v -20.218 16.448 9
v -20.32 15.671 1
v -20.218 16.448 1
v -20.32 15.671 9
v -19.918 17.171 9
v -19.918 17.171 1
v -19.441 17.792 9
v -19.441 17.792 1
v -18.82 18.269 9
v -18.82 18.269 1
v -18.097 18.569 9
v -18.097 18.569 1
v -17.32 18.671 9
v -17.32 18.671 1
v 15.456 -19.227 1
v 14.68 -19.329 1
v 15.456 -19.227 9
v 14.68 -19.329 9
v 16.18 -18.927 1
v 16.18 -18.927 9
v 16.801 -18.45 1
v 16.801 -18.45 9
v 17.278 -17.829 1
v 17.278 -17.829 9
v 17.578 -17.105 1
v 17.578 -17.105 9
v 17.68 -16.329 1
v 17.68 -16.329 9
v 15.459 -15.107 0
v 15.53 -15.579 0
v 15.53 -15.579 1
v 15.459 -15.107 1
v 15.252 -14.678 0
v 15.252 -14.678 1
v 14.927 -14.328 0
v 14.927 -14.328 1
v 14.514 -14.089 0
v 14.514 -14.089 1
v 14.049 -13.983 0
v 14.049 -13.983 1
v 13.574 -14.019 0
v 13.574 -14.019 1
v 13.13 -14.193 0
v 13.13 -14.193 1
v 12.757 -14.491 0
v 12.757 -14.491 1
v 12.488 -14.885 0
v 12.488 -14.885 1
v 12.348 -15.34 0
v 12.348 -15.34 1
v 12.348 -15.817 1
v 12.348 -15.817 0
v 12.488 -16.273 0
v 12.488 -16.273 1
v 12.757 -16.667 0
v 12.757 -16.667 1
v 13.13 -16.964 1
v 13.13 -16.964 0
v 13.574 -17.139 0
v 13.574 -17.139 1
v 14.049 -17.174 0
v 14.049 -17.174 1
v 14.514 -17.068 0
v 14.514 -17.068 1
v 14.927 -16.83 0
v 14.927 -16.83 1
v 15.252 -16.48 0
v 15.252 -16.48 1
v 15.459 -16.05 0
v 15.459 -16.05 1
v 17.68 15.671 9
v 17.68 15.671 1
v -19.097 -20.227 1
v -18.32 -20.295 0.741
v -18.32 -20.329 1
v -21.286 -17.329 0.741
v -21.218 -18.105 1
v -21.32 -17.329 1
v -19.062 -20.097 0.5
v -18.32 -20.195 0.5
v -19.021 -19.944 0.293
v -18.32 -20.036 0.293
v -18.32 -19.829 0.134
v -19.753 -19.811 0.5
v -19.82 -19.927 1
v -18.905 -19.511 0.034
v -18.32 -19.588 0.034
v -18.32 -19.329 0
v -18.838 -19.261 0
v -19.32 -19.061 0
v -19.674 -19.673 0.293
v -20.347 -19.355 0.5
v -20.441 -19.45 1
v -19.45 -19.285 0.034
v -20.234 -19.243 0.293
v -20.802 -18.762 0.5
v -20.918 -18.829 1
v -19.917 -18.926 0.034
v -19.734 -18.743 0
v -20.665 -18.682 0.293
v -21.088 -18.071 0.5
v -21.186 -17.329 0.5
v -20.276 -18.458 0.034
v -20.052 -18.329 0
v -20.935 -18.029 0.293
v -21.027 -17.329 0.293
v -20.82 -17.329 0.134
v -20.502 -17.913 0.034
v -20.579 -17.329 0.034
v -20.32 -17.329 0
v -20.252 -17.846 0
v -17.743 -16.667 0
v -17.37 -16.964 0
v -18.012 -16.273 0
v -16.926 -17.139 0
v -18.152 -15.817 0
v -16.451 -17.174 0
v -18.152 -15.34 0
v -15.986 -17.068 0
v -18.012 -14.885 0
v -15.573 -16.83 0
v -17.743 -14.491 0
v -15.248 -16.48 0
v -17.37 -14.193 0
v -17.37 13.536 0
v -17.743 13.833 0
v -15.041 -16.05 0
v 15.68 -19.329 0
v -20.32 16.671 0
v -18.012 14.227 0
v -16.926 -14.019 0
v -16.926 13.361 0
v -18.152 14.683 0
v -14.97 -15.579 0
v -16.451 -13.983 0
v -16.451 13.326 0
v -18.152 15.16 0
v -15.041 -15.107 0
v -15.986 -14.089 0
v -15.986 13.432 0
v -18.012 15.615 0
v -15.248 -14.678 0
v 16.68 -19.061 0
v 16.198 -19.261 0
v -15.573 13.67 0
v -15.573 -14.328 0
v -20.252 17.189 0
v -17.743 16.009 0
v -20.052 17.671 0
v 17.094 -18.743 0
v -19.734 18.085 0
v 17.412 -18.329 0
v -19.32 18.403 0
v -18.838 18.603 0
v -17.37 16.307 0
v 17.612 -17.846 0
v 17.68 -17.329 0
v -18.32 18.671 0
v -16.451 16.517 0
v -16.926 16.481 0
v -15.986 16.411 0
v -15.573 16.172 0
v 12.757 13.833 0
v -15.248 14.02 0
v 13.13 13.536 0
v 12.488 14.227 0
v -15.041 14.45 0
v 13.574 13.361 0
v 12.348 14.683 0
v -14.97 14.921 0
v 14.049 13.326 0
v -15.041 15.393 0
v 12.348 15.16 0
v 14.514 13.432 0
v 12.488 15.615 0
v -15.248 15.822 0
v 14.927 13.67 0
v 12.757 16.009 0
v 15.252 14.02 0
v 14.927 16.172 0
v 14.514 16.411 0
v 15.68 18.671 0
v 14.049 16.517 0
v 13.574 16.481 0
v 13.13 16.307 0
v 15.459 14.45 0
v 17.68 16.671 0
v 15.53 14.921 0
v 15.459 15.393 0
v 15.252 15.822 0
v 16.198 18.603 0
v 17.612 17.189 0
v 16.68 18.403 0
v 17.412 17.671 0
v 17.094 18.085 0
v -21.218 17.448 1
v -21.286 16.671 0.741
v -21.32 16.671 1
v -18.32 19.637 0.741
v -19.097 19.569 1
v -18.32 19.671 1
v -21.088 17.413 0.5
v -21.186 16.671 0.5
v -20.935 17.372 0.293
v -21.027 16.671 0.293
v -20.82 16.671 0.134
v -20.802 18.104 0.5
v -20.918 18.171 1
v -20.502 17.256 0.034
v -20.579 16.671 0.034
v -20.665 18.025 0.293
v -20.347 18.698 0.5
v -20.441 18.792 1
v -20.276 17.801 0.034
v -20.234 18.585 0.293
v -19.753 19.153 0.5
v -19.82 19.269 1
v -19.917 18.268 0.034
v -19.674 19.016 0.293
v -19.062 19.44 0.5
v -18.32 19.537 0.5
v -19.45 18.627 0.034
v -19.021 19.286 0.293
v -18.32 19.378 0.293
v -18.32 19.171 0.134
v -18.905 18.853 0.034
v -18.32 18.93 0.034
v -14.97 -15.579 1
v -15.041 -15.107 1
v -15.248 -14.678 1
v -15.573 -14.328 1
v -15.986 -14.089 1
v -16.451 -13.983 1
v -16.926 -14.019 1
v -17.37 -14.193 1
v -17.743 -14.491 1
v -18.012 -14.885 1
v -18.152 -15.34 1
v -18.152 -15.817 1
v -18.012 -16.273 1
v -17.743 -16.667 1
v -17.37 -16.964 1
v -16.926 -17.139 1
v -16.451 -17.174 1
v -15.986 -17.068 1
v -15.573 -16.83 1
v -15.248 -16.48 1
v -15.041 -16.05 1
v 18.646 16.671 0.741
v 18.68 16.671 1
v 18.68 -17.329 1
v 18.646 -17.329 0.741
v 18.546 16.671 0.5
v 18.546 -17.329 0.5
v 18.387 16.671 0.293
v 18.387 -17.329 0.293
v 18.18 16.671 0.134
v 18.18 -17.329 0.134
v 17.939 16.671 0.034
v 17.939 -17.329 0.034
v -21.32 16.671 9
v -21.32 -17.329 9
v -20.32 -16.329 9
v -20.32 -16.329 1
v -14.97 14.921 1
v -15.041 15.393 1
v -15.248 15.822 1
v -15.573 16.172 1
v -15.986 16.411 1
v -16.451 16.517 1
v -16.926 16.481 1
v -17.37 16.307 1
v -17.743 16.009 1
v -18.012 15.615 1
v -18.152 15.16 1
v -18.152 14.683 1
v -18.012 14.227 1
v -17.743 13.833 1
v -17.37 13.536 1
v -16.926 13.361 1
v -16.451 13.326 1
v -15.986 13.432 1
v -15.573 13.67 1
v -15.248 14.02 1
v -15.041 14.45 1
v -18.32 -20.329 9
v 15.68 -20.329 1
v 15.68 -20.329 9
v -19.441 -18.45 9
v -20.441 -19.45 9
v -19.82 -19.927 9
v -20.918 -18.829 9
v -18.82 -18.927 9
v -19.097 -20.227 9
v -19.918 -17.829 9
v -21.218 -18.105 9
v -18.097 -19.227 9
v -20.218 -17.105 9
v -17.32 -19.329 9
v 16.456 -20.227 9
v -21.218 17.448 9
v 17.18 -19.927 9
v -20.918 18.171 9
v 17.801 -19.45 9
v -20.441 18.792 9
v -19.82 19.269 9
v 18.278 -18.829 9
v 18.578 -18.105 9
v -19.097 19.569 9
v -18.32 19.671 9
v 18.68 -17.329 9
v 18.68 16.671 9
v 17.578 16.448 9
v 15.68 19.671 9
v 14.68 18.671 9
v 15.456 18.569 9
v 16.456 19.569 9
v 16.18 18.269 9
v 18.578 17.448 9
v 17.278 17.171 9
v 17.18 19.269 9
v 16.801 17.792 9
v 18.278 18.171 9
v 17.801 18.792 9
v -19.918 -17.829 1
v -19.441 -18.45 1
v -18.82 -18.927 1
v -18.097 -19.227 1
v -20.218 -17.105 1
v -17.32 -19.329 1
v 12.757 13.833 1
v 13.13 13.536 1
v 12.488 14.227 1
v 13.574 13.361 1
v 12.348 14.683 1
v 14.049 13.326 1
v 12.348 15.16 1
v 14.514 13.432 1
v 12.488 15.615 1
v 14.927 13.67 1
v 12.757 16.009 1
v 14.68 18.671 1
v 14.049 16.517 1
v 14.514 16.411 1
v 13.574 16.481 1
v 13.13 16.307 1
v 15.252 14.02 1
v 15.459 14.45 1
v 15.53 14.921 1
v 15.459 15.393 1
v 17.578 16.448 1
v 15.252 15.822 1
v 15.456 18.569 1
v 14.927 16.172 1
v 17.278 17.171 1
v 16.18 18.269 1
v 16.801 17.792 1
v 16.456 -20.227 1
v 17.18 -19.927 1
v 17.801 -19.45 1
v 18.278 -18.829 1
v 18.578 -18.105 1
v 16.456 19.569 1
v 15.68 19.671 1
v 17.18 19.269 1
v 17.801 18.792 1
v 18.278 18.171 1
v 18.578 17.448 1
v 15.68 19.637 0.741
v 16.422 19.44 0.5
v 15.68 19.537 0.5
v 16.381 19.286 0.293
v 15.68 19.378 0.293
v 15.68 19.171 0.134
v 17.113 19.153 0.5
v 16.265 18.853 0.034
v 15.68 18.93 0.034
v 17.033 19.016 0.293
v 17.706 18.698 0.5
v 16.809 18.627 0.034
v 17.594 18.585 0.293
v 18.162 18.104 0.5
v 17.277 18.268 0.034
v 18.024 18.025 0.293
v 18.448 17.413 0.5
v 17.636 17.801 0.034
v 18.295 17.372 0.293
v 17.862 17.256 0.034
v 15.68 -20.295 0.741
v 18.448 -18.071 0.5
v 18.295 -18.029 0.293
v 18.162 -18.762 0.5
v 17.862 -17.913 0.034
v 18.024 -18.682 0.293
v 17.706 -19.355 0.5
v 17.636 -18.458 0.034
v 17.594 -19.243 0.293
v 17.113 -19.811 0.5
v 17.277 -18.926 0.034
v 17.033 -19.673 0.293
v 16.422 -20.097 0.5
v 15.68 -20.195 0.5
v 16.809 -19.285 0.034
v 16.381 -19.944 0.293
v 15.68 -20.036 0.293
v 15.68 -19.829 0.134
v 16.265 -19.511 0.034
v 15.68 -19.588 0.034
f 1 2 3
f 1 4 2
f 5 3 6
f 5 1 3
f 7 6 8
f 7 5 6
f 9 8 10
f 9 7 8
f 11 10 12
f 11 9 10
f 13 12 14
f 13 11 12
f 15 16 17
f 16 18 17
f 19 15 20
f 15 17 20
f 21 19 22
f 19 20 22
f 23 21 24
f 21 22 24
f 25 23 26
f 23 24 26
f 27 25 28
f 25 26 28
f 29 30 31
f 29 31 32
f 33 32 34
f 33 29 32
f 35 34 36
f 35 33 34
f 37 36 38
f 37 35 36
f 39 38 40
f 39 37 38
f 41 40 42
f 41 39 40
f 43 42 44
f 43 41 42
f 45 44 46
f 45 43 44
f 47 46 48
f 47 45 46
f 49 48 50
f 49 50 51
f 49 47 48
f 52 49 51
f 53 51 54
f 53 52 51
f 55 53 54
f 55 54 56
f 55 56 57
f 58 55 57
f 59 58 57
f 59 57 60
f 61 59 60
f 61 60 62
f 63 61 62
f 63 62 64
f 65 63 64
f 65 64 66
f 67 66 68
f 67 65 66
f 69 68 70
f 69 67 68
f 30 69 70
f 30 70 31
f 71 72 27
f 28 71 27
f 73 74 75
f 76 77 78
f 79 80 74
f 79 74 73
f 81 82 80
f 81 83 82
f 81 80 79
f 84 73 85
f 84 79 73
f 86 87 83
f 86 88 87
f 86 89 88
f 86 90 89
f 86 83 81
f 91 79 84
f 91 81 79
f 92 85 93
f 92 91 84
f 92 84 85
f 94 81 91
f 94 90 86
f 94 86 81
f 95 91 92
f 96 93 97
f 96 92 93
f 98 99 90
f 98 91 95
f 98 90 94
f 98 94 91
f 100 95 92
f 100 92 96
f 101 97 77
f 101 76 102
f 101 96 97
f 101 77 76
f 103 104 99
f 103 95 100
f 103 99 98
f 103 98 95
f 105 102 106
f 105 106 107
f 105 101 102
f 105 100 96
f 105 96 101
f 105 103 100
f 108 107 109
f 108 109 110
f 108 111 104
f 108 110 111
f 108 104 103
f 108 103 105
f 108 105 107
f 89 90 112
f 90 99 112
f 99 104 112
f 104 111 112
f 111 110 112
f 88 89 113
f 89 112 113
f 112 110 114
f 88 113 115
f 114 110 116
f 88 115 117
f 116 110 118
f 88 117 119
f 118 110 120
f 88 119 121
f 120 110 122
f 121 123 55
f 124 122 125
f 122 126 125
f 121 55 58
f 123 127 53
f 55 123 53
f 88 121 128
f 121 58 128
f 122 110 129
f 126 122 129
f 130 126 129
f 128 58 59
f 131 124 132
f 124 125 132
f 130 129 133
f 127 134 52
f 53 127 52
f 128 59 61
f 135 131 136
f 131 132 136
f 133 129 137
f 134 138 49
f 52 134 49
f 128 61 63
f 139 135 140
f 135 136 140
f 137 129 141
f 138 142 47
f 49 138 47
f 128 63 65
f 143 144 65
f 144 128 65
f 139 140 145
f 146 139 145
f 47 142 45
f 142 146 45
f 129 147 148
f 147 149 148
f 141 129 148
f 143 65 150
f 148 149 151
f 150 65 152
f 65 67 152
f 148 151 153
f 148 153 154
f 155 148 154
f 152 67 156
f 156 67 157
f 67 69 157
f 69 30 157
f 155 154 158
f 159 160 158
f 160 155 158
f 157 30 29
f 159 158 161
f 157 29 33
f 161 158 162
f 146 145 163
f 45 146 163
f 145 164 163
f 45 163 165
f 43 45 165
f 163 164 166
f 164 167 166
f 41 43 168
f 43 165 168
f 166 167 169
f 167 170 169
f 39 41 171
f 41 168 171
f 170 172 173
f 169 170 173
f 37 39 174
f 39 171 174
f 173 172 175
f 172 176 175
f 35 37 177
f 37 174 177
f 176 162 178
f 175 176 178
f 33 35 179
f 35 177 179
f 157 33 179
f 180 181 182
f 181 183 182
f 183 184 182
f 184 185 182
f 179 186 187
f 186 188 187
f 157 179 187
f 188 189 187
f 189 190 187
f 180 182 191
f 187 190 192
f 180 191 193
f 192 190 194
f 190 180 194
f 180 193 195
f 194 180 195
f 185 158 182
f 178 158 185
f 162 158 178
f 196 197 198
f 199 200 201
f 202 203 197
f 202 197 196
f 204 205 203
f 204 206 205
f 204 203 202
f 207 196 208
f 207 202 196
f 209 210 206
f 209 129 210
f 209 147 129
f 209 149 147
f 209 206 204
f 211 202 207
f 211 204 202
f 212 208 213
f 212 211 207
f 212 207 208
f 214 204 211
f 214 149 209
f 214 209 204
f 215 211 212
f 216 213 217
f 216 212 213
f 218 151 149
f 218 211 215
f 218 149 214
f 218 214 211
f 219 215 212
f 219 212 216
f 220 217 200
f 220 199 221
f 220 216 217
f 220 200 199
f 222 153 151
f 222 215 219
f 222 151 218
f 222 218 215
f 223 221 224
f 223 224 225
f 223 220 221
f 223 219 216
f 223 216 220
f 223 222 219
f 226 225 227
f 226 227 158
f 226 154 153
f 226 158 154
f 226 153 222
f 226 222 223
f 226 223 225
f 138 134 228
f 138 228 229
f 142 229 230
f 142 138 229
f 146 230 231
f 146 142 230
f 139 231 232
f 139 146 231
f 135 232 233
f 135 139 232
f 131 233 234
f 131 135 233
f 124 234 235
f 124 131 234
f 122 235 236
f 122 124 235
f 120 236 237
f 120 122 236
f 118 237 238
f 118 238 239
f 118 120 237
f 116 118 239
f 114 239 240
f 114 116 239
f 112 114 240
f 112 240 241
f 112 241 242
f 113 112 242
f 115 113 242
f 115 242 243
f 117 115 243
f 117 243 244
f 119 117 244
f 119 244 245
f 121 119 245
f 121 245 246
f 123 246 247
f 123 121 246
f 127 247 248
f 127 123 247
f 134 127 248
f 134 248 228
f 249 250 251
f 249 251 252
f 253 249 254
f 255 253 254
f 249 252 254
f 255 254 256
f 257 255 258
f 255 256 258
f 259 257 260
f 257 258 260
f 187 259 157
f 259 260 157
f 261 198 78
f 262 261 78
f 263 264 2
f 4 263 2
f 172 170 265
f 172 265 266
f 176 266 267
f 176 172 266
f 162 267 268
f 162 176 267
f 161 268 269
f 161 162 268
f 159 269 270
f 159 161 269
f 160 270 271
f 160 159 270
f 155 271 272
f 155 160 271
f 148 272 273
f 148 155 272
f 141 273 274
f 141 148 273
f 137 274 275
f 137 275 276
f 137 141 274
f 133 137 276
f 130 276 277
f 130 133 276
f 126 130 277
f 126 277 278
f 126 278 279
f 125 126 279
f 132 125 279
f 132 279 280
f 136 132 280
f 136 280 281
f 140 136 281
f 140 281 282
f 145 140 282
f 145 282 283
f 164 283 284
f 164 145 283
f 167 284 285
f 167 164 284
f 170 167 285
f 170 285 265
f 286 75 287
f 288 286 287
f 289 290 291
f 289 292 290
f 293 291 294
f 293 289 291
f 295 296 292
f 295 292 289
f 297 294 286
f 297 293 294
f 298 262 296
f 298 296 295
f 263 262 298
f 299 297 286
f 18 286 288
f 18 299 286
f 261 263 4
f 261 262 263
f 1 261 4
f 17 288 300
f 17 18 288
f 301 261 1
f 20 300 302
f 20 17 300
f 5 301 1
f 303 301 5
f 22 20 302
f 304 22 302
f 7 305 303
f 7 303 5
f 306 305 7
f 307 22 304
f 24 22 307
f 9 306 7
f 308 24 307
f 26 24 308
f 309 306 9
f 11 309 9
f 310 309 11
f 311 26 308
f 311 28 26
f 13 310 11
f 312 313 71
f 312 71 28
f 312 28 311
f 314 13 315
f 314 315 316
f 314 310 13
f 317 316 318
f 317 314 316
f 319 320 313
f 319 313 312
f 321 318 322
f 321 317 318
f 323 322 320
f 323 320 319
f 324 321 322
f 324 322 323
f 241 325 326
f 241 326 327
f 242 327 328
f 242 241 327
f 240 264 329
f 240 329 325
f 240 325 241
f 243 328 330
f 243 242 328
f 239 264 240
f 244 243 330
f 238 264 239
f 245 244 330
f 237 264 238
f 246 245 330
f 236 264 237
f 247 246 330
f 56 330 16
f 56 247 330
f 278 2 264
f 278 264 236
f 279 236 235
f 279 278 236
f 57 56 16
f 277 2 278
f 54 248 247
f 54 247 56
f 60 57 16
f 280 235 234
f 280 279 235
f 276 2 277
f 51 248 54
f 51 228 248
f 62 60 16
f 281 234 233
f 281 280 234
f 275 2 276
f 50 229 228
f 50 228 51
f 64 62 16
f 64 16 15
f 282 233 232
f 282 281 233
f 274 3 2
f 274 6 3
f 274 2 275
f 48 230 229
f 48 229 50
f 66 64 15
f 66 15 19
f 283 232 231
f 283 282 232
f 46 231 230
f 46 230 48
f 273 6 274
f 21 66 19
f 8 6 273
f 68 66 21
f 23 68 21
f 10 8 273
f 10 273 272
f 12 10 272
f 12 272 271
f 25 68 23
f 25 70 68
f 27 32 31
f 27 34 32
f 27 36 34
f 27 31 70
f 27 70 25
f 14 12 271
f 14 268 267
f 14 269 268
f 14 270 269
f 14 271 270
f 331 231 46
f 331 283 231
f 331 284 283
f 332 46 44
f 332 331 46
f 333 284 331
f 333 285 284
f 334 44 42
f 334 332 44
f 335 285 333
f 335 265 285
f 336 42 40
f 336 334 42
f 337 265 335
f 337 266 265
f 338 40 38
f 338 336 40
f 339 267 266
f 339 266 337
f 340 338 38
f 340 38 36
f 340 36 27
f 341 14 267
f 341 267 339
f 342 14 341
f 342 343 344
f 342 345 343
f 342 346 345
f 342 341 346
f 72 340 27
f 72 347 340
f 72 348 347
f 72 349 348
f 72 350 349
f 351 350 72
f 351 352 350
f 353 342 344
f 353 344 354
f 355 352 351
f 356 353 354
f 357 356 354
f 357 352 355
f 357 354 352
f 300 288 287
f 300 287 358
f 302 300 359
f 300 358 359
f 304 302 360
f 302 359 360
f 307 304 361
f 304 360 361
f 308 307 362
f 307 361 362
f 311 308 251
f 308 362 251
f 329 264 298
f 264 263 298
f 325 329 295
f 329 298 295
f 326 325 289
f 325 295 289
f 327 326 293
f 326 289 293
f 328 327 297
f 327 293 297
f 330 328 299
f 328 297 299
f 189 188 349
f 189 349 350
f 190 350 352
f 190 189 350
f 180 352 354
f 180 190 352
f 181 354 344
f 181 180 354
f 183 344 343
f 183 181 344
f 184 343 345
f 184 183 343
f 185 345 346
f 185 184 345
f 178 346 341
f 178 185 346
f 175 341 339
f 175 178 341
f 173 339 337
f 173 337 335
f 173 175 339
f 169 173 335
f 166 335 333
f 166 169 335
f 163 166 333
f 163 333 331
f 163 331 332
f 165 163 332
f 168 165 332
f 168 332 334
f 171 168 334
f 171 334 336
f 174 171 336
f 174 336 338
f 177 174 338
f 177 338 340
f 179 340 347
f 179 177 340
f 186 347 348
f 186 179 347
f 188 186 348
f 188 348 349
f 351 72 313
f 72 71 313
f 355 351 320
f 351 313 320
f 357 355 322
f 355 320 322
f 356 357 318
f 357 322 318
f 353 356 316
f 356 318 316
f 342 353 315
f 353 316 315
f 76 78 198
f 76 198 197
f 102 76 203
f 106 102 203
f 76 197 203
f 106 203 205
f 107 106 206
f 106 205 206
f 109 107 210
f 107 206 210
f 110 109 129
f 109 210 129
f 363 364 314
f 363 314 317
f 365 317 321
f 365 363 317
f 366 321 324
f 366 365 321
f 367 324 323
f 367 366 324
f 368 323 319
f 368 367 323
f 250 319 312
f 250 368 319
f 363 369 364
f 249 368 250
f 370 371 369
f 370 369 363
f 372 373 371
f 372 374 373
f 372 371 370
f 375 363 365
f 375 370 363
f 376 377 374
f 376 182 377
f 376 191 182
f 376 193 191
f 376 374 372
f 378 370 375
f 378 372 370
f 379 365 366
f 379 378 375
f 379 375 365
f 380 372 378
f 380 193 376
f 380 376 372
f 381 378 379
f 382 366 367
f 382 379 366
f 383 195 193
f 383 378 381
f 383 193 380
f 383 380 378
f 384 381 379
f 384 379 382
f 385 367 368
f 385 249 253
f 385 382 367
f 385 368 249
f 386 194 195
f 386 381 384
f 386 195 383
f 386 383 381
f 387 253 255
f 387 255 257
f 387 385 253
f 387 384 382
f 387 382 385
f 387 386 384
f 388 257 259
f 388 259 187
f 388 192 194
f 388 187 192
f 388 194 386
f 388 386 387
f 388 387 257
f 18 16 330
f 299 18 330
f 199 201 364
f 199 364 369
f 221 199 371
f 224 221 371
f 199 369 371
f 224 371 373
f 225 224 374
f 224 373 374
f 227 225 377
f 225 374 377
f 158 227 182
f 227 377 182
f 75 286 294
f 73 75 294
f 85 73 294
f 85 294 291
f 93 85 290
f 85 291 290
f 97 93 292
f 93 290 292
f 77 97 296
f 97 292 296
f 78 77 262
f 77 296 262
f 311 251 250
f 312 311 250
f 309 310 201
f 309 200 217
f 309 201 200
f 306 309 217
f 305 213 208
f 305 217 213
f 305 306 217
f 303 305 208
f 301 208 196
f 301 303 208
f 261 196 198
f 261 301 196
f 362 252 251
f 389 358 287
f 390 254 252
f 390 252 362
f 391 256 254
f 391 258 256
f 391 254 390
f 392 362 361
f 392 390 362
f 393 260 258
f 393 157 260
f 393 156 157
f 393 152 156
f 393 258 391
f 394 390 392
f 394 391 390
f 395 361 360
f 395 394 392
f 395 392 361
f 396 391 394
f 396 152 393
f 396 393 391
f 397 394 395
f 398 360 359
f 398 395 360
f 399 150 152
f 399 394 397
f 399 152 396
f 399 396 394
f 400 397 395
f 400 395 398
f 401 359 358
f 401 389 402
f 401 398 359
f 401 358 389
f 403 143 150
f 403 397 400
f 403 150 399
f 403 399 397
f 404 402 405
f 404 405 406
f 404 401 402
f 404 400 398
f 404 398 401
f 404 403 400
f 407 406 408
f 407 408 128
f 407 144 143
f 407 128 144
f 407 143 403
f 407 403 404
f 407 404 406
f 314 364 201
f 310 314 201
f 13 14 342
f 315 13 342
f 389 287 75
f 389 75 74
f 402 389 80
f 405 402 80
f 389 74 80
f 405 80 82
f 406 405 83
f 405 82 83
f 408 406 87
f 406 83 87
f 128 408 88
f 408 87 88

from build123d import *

# Parameters (mm, degrees)
F0_W     = 40
F0_H     = 40
F0_R     = 1.6
F1_DEPTH = 1
F3_DEPTH = 8
F4_R     = 3
F5_R     = 1


with BuildPart() as f1:
    # F0 (on Top) → F1 (new body)
    with BuildSketch(Plane.XY):
        with Locations((-1.320125, -0.328824)):
            Rectangle(F0_W, F0_H)
        with Locations((-16.570125, -15.578824)):
            Circle(F0_R, mode=Mode.SUBTRACT)
        with Locations((13.929875, -15.578824)):
            Circle(F0_R, mode=Mode.SUBTRACT)
        with Locations((-16.570125, 14.921176)):
            Circle(F0_R, mode=Mode.SUBTRACT)
        with Locations((13.929875, 14.921176)):
            Circle(F0_R, mode=Mode.SUBTRACT)
    extrude(amount=F1_DEPTH)

    # F2 (on face) → F3 (join)
    with BuildSketch(Plane.XY.offset(1)):
        Polygon((18.679875, -15.328824), (18.679875, 14.671176), (18.679875, 19.671176), (13.679875, 19.671176), (-16.320125, 19.671176), (-21.320125, 19.671176), (-21.320125, 14.671176), (-21.320125, -15.328824), (-21.320125, -20.328824), (-16.320125, -20.328824), (13.679875, -20.328824), (18.679875, -20.328824), align=None)
        Polygon((17.679875, 18.671176), (17.679875, 14.671176), (17.679875, -15.328824), (17.679875, -19.328824), (13.679875, -19.328824), (-16.320125, -19.328824), (-20.320125, -19.328824), (-20.320125, -15.328824), (-20.320125, 14.671176), (-20.320125, 18.671176), (-16.320125, 18.671176), (13.679875, 18.671176), align=None, mode=Mode.SUBTRACT)
    extrude(amount=F3_DEPTH)

    # F4
    f4_edges = [f1.edges().sort_by_distance(p)[0] for p in [
        (-20.320125, -19.328824, 5),
        (-20.320125, 18.671176, 5),
        (17.679875, 18.671176, 5),
        (17.679875, -19.328824, 5),
        (18.679875, -20.328824, 4.5),
        (18.679875, 19.671176, 4.5),
        (-21.320125, 19.671176, 4.5),
        (-21.320125, -20.328824, 4.5),
    ]]
    fillet(f4_edges, radius=F4_R)

    # F5
    f5_edges = [f1.edges().sort_by_distance(p)[0] for p in [
        (-1.320125, 19.671176, 0),
    ]]
    fillet(f5_edges, radius=F5_R)


solid = f1.part
